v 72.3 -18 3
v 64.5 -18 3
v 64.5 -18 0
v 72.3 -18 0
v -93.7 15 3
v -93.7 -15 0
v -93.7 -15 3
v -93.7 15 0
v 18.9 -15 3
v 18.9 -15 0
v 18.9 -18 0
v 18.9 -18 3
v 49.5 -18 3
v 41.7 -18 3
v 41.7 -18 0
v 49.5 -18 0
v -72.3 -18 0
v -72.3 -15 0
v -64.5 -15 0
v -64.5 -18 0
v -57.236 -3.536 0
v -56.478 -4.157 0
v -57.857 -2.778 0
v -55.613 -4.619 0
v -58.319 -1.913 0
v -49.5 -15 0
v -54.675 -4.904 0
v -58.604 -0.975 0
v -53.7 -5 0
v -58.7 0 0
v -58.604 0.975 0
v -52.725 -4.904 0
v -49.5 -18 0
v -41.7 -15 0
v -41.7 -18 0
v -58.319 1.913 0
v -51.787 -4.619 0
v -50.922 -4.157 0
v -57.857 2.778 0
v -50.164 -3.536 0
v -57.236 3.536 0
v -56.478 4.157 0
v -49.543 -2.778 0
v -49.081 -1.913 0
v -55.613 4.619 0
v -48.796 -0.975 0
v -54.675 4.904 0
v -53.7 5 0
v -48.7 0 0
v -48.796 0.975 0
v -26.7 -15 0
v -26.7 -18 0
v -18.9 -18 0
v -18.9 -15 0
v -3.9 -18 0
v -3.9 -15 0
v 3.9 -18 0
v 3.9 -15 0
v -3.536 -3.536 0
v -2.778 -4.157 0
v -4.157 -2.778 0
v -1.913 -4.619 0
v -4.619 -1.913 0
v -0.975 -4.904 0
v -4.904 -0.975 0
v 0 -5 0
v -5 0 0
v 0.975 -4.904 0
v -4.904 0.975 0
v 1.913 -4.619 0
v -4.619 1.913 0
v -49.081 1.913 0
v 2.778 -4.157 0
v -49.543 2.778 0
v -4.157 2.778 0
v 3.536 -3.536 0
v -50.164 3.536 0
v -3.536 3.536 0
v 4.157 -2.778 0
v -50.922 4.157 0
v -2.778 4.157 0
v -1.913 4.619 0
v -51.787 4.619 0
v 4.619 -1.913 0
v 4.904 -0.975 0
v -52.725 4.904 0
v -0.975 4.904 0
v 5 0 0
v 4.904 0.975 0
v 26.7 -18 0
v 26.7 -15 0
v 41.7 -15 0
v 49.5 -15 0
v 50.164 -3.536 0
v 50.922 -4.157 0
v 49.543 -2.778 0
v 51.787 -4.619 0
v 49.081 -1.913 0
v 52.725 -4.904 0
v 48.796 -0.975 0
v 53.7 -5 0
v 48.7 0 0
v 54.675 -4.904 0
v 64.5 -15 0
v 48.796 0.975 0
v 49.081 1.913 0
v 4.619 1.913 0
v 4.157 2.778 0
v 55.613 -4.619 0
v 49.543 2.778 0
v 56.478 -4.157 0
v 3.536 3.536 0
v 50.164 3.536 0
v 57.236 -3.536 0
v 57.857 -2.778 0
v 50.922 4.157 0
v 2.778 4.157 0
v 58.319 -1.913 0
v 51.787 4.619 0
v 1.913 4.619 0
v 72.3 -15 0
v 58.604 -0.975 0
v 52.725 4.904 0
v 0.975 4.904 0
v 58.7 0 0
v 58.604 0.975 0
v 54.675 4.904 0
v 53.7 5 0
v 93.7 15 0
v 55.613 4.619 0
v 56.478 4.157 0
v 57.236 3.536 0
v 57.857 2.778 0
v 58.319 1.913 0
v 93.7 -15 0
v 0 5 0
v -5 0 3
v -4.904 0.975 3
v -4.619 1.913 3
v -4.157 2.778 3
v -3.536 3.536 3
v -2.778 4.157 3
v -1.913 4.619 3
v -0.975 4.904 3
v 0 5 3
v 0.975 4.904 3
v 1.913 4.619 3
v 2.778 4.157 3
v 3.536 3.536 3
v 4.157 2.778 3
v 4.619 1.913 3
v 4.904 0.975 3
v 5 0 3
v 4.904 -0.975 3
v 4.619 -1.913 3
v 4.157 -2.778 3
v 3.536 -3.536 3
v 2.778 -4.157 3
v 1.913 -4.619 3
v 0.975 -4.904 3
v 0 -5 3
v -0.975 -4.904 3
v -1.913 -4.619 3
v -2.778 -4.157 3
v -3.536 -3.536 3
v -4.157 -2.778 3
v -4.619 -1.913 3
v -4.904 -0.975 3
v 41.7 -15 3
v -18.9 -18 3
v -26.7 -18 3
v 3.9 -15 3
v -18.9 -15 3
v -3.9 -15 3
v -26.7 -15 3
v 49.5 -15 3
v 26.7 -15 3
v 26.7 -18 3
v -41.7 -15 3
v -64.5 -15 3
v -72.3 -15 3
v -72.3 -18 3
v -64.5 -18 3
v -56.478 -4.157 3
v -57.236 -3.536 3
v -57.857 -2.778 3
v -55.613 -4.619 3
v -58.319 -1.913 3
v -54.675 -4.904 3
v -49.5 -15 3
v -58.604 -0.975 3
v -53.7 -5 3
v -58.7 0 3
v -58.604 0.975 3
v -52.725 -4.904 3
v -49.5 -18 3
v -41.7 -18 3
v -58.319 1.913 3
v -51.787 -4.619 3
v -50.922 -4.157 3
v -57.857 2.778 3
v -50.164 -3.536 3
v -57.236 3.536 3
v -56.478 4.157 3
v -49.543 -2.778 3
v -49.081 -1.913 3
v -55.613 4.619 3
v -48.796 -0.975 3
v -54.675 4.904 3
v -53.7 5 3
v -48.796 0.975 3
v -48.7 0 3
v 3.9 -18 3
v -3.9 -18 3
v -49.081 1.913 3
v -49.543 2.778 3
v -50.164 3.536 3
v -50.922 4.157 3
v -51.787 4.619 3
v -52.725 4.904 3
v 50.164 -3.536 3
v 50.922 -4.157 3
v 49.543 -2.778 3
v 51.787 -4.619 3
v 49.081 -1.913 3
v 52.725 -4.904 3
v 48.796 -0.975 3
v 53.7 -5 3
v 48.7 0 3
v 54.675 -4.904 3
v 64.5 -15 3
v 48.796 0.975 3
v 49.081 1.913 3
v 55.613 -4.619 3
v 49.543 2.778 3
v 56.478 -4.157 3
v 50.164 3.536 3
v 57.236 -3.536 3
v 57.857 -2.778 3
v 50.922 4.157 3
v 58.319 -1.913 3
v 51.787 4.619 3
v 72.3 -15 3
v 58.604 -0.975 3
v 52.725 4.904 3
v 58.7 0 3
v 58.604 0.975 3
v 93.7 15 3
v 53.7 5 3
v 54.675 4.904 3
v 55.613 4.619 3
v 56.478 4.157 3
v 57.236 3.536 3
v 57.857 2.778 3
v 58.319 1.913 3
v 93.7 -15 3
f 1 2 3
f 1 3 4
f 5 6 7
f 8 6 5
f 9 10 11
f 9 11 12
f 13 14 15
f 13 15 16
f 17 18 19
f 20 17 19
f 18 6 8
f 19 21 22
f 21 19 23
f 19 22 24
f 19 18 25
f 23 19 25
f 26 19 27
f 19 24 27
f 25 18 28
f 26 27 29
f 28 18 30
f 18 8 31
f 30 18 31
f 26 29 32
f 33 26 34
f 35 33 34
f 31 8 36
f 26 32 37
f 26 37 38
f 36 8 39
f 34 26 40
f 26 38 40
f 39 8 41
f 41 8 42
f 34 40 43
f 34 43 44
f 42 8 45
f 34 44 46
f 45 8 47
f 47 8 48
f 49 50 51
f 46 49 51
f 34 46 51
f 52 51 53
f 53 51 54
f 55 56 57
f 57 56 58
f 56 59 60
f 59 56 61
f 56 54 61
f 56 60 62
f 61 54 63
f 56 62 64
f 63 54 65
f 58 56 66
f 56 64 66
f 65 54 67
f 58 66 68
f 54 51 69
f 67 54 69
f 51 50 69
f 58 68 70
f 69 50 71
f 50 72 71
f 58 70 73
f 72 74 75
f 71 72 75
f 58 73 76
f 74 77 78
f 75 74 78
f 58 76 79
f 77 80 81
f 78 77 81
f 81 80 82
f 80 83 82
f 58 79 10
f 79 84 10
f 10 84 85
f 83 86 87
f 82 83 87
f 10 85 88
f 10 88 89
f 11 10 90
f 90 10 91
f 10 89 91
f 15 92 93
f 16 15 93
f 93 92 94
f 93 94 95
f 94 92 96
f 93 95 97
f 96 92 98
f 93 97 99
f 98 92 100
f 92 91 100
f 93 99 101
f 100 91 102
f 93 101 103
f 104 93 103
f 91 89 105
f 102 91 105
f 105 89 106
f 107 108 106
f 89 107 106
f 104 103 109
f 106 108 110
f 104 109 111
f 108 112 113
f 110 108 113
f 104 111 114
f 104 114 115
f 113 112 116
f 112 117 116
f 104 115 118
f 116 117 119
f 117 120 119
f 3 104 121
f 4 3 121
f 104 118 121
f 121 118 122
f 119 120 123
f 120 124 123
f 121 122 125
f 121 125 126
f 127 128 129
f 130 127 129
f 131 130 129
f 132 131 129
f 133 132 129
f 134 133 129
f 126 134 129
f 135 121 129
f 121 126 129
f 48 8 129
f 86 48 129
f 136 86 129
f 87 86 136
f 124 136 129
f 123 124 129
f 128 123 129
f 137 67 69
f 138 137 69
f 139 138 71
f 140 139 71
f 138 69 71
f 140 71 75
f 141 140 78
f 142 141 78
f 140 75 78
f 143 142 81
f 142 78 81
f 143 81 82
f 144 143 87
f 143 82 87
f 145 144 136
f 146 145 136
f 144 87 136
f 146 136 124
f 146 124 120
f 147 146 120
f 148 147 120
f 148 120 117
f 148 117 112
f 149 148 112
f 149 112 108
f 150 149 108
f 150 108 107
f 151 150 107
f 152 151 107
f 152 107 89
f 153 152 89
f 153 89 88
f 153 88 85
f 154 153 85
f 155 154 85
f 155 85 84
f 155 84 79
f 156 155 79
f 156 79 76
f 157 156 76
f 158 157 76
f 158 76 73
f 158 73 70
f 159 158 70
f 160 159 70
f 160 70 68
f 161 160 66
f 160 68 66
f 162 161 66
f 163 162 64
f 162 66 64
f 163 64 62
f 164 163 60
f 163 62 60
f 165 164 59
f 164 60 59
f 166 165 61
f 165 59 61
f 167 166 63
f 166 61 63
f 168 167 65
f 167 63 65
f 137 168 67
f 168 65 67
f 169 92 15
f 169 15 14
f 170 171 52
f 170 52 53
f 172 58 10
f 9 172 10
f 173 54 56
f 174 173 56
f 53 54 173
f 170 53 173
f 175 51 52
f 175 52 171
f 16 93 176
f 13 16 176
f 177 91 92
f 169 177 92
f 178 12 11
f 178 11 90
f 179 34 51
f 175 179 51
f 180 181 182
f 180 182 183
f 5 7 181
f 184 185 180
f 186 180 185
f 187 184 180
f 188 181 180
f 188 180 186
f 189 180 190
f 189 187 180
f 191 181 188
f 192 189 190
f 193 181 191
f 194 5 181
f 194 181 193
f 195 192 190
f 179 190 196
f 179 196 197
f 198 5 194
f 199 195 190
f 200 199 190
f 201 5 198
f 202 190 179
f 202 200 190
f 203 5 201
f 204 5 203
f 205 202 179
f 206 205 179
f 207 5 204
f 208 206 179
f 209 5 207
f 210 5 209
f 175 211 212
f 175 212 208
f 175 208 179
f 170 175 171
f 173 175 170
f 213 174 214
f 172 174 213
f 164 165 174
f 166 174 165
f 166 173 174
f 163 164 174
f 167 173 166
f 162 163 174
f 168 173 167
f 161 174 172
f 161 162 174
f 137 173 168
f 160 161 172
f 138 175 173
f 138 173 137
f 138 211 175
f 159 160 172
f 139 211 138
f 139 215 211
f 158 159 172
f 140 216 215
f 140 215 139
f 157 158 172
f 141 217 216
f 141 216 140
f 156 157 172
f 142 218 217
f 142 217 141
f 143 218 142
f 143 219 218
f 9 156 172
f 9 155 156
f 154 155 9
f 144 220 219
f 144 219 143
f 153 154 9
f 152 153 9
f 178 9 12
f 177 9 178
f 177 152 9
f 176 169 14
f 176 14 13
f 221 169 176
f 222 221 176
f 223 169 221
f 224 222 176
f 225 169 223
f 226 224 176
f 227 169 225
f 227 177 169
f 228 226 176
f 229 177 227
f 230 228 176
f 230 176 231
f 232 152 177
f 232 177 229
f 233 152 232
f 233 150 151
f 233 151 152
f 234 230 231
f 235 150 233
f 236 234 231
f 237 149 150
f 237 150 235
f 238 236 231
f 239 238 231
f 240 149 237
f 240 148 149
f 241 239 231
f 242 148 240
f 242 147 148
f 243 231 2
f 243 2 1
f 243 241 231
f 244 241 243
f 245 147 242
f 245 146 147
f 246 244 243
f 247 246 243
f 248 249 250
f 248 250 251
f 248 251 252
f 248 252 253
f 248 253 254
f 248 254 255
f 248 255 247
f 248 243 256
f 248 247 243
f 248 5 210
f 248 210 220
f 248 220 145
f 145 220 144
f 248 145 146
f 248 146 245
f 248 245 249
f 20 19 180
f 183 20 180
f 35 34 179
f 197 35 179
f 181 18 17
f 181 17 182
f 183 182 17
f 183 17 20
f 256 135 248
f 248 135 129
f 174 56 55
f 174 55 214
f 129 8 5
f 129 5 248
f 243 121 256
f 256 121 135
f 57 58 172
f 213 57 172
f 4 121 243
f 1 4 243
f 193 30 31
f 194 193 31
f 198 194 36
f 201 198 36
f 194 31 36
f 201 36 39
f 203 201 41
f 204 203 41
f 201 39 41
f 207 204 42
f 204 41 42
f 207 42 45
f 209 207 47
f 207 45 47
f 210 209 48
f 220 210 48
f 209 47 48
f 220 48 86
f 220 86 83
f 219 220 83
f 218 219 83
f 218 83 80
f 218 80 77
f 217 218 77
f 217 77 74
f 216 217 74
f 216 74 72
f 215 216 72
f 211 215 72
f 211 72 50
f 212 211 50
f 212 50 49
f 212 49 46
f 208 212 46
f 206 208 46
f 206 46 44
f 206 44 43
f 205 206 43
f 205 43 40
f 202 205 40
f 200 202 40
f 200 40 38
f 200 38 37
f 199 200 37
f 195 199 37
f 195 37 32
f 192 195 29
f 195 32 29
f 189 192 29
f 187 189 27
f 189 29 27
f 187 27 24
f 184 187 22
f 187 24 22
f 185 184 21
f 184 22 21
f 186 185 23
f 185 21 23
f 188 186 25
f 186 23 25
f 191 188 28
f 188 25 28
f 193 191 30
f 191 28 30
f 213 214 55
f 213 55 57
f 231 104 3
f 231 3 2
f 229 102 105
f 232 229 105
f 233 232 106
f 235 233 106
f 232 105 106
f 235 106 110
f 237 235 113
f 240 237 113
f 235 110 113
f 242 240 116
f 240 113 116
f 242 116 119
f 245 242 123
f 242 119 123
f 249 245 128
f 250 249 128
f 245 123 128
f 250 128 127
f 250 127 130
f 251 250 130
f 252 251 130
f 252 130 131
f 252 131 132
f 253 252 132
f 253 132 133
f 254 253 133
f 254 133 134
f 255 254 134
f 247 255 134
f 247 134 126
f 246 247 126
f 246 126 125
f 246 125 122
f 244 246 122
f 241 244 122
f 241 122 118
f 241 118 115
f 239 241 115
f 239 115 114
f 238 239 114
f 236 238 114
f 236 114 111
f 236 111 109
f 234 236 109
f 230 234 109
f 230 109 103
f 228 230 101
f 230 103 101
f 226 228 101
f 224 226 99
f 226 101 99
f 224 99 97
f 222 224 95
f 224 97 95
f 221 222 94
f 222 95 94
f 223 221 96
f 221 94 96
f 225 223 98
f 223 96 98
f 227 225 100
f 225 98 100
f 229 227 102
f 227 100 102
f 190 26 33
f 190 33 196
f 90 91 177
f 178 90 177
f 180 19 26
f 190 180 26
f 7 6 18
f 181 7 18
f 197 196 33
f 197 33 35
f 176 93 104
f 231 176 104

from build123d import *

# Parameters (mm, degrees)
SKETCH1_W           = 187.4
SKETCH1_H           = 30
BOSS_EXTRUDE1_DEPTH = 3
SKETCH2_W           = 7.8
SKETCH2_H           = 3
BOSS_EXTRUDE2_DEPTH = 3
LPATTERN2_COUNT     = 4
LPATTERN2_PITCH     = 22.8
LPATTERN2_COL_COUNT = 4
LPATTERN2_COL_PITCH = 22.8
SKETCH3_R           = 5
CUT_EXTRUDE1_DEPTH  = 96.460410642


with BuildPart() as part:
    # Sketch1 → Boss-Extrude1 (new body)
    with BuildSketch(Plane.XY):
        Rectangle(SKETCH1_W, SKETCH1_H)
    extrude(amount=BOSS_EXTRUDE1_DEPTH)

    # Sketch2 → Boss-Extrude2 (add)
    with BuildSketch(Plane.XZ.offset(15)):
        with Locations((0, 1.5)):
            Rectangle(SKETCH2_W, SKETCH2_H)
    boss_extrude2 = extrude(amount=BOSS_EXTRUDE2_DEPTH)

    # LPattern2: Boss-Extrude2 ×4
    with Locations(*[(i * LPATTERN2_PITCH, 0, 0) for i in range(1, LPATTERN2_COUNT)]):
        add(boss_extrude2)

    # LPattern2 col: Boss-Extrude2 ×4
    with Locations(*[(-i * LPATTERN2_COL_PITCH, 0, 0) for i in range(1, LPATTERN2_COL_COUNT)]):
        add(boss_extrude2)

    # Sketch3 → Cut-Extrude1 (cut, through all)
    with BuildSketch(Plane(origin=(0, 0, 0), x_dir=(-1, 0, 0), z_dir=(0, 0, -1))):
        Circle(SKETCH3_R)
        with Locations((-53.7, 0)):
            Circle(SKETCH3_R)
        with Locations((53.7, 0)):
            Circle(SKETCH3_R)
    extrude(amount=-CUT_EXTRUDE1_DEPTH, mode=Mode.SUBTRACT)


solid = part.part
